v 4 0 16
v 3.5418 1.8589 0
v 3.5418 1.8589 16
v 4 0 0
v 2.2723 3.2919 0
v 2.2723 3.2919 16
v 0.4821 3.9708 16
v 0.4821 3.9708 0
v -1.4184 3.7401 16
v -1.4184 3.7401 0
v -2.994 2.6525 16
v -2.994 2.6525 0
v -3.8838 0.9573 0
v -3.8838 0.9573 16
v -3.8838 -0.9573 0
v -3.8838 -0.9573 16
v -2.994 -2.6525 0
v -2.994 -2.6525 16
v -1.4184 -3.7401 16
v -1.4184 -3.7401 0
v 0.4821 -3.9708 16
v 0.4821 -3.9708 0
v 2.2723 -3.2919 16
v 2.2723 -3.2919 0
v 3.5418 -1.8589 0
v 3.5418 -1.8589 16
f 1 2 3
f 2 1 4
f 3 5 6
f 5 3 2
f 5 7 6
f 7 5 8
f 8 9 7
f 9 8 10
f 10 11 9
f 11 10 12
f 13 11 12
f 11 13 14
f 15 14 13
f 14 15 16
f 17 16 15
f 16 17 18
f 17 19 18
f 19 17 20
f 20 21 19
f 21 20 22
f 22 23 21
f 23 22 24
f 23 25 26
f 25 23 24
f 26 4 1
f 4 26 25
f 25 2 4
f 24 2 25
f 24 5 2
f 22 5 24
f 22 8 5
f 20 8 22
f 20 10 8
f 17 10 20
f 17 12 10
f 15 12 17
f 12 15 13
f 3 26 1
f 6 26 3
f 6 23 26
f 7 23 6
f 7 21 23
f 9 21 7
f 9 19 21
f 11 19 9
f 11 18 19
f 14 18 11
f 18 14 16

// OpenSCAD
module side_cylinder() {
    cylinder(h=16, r=4);
}

// call module when run directly
side_cylinder();
